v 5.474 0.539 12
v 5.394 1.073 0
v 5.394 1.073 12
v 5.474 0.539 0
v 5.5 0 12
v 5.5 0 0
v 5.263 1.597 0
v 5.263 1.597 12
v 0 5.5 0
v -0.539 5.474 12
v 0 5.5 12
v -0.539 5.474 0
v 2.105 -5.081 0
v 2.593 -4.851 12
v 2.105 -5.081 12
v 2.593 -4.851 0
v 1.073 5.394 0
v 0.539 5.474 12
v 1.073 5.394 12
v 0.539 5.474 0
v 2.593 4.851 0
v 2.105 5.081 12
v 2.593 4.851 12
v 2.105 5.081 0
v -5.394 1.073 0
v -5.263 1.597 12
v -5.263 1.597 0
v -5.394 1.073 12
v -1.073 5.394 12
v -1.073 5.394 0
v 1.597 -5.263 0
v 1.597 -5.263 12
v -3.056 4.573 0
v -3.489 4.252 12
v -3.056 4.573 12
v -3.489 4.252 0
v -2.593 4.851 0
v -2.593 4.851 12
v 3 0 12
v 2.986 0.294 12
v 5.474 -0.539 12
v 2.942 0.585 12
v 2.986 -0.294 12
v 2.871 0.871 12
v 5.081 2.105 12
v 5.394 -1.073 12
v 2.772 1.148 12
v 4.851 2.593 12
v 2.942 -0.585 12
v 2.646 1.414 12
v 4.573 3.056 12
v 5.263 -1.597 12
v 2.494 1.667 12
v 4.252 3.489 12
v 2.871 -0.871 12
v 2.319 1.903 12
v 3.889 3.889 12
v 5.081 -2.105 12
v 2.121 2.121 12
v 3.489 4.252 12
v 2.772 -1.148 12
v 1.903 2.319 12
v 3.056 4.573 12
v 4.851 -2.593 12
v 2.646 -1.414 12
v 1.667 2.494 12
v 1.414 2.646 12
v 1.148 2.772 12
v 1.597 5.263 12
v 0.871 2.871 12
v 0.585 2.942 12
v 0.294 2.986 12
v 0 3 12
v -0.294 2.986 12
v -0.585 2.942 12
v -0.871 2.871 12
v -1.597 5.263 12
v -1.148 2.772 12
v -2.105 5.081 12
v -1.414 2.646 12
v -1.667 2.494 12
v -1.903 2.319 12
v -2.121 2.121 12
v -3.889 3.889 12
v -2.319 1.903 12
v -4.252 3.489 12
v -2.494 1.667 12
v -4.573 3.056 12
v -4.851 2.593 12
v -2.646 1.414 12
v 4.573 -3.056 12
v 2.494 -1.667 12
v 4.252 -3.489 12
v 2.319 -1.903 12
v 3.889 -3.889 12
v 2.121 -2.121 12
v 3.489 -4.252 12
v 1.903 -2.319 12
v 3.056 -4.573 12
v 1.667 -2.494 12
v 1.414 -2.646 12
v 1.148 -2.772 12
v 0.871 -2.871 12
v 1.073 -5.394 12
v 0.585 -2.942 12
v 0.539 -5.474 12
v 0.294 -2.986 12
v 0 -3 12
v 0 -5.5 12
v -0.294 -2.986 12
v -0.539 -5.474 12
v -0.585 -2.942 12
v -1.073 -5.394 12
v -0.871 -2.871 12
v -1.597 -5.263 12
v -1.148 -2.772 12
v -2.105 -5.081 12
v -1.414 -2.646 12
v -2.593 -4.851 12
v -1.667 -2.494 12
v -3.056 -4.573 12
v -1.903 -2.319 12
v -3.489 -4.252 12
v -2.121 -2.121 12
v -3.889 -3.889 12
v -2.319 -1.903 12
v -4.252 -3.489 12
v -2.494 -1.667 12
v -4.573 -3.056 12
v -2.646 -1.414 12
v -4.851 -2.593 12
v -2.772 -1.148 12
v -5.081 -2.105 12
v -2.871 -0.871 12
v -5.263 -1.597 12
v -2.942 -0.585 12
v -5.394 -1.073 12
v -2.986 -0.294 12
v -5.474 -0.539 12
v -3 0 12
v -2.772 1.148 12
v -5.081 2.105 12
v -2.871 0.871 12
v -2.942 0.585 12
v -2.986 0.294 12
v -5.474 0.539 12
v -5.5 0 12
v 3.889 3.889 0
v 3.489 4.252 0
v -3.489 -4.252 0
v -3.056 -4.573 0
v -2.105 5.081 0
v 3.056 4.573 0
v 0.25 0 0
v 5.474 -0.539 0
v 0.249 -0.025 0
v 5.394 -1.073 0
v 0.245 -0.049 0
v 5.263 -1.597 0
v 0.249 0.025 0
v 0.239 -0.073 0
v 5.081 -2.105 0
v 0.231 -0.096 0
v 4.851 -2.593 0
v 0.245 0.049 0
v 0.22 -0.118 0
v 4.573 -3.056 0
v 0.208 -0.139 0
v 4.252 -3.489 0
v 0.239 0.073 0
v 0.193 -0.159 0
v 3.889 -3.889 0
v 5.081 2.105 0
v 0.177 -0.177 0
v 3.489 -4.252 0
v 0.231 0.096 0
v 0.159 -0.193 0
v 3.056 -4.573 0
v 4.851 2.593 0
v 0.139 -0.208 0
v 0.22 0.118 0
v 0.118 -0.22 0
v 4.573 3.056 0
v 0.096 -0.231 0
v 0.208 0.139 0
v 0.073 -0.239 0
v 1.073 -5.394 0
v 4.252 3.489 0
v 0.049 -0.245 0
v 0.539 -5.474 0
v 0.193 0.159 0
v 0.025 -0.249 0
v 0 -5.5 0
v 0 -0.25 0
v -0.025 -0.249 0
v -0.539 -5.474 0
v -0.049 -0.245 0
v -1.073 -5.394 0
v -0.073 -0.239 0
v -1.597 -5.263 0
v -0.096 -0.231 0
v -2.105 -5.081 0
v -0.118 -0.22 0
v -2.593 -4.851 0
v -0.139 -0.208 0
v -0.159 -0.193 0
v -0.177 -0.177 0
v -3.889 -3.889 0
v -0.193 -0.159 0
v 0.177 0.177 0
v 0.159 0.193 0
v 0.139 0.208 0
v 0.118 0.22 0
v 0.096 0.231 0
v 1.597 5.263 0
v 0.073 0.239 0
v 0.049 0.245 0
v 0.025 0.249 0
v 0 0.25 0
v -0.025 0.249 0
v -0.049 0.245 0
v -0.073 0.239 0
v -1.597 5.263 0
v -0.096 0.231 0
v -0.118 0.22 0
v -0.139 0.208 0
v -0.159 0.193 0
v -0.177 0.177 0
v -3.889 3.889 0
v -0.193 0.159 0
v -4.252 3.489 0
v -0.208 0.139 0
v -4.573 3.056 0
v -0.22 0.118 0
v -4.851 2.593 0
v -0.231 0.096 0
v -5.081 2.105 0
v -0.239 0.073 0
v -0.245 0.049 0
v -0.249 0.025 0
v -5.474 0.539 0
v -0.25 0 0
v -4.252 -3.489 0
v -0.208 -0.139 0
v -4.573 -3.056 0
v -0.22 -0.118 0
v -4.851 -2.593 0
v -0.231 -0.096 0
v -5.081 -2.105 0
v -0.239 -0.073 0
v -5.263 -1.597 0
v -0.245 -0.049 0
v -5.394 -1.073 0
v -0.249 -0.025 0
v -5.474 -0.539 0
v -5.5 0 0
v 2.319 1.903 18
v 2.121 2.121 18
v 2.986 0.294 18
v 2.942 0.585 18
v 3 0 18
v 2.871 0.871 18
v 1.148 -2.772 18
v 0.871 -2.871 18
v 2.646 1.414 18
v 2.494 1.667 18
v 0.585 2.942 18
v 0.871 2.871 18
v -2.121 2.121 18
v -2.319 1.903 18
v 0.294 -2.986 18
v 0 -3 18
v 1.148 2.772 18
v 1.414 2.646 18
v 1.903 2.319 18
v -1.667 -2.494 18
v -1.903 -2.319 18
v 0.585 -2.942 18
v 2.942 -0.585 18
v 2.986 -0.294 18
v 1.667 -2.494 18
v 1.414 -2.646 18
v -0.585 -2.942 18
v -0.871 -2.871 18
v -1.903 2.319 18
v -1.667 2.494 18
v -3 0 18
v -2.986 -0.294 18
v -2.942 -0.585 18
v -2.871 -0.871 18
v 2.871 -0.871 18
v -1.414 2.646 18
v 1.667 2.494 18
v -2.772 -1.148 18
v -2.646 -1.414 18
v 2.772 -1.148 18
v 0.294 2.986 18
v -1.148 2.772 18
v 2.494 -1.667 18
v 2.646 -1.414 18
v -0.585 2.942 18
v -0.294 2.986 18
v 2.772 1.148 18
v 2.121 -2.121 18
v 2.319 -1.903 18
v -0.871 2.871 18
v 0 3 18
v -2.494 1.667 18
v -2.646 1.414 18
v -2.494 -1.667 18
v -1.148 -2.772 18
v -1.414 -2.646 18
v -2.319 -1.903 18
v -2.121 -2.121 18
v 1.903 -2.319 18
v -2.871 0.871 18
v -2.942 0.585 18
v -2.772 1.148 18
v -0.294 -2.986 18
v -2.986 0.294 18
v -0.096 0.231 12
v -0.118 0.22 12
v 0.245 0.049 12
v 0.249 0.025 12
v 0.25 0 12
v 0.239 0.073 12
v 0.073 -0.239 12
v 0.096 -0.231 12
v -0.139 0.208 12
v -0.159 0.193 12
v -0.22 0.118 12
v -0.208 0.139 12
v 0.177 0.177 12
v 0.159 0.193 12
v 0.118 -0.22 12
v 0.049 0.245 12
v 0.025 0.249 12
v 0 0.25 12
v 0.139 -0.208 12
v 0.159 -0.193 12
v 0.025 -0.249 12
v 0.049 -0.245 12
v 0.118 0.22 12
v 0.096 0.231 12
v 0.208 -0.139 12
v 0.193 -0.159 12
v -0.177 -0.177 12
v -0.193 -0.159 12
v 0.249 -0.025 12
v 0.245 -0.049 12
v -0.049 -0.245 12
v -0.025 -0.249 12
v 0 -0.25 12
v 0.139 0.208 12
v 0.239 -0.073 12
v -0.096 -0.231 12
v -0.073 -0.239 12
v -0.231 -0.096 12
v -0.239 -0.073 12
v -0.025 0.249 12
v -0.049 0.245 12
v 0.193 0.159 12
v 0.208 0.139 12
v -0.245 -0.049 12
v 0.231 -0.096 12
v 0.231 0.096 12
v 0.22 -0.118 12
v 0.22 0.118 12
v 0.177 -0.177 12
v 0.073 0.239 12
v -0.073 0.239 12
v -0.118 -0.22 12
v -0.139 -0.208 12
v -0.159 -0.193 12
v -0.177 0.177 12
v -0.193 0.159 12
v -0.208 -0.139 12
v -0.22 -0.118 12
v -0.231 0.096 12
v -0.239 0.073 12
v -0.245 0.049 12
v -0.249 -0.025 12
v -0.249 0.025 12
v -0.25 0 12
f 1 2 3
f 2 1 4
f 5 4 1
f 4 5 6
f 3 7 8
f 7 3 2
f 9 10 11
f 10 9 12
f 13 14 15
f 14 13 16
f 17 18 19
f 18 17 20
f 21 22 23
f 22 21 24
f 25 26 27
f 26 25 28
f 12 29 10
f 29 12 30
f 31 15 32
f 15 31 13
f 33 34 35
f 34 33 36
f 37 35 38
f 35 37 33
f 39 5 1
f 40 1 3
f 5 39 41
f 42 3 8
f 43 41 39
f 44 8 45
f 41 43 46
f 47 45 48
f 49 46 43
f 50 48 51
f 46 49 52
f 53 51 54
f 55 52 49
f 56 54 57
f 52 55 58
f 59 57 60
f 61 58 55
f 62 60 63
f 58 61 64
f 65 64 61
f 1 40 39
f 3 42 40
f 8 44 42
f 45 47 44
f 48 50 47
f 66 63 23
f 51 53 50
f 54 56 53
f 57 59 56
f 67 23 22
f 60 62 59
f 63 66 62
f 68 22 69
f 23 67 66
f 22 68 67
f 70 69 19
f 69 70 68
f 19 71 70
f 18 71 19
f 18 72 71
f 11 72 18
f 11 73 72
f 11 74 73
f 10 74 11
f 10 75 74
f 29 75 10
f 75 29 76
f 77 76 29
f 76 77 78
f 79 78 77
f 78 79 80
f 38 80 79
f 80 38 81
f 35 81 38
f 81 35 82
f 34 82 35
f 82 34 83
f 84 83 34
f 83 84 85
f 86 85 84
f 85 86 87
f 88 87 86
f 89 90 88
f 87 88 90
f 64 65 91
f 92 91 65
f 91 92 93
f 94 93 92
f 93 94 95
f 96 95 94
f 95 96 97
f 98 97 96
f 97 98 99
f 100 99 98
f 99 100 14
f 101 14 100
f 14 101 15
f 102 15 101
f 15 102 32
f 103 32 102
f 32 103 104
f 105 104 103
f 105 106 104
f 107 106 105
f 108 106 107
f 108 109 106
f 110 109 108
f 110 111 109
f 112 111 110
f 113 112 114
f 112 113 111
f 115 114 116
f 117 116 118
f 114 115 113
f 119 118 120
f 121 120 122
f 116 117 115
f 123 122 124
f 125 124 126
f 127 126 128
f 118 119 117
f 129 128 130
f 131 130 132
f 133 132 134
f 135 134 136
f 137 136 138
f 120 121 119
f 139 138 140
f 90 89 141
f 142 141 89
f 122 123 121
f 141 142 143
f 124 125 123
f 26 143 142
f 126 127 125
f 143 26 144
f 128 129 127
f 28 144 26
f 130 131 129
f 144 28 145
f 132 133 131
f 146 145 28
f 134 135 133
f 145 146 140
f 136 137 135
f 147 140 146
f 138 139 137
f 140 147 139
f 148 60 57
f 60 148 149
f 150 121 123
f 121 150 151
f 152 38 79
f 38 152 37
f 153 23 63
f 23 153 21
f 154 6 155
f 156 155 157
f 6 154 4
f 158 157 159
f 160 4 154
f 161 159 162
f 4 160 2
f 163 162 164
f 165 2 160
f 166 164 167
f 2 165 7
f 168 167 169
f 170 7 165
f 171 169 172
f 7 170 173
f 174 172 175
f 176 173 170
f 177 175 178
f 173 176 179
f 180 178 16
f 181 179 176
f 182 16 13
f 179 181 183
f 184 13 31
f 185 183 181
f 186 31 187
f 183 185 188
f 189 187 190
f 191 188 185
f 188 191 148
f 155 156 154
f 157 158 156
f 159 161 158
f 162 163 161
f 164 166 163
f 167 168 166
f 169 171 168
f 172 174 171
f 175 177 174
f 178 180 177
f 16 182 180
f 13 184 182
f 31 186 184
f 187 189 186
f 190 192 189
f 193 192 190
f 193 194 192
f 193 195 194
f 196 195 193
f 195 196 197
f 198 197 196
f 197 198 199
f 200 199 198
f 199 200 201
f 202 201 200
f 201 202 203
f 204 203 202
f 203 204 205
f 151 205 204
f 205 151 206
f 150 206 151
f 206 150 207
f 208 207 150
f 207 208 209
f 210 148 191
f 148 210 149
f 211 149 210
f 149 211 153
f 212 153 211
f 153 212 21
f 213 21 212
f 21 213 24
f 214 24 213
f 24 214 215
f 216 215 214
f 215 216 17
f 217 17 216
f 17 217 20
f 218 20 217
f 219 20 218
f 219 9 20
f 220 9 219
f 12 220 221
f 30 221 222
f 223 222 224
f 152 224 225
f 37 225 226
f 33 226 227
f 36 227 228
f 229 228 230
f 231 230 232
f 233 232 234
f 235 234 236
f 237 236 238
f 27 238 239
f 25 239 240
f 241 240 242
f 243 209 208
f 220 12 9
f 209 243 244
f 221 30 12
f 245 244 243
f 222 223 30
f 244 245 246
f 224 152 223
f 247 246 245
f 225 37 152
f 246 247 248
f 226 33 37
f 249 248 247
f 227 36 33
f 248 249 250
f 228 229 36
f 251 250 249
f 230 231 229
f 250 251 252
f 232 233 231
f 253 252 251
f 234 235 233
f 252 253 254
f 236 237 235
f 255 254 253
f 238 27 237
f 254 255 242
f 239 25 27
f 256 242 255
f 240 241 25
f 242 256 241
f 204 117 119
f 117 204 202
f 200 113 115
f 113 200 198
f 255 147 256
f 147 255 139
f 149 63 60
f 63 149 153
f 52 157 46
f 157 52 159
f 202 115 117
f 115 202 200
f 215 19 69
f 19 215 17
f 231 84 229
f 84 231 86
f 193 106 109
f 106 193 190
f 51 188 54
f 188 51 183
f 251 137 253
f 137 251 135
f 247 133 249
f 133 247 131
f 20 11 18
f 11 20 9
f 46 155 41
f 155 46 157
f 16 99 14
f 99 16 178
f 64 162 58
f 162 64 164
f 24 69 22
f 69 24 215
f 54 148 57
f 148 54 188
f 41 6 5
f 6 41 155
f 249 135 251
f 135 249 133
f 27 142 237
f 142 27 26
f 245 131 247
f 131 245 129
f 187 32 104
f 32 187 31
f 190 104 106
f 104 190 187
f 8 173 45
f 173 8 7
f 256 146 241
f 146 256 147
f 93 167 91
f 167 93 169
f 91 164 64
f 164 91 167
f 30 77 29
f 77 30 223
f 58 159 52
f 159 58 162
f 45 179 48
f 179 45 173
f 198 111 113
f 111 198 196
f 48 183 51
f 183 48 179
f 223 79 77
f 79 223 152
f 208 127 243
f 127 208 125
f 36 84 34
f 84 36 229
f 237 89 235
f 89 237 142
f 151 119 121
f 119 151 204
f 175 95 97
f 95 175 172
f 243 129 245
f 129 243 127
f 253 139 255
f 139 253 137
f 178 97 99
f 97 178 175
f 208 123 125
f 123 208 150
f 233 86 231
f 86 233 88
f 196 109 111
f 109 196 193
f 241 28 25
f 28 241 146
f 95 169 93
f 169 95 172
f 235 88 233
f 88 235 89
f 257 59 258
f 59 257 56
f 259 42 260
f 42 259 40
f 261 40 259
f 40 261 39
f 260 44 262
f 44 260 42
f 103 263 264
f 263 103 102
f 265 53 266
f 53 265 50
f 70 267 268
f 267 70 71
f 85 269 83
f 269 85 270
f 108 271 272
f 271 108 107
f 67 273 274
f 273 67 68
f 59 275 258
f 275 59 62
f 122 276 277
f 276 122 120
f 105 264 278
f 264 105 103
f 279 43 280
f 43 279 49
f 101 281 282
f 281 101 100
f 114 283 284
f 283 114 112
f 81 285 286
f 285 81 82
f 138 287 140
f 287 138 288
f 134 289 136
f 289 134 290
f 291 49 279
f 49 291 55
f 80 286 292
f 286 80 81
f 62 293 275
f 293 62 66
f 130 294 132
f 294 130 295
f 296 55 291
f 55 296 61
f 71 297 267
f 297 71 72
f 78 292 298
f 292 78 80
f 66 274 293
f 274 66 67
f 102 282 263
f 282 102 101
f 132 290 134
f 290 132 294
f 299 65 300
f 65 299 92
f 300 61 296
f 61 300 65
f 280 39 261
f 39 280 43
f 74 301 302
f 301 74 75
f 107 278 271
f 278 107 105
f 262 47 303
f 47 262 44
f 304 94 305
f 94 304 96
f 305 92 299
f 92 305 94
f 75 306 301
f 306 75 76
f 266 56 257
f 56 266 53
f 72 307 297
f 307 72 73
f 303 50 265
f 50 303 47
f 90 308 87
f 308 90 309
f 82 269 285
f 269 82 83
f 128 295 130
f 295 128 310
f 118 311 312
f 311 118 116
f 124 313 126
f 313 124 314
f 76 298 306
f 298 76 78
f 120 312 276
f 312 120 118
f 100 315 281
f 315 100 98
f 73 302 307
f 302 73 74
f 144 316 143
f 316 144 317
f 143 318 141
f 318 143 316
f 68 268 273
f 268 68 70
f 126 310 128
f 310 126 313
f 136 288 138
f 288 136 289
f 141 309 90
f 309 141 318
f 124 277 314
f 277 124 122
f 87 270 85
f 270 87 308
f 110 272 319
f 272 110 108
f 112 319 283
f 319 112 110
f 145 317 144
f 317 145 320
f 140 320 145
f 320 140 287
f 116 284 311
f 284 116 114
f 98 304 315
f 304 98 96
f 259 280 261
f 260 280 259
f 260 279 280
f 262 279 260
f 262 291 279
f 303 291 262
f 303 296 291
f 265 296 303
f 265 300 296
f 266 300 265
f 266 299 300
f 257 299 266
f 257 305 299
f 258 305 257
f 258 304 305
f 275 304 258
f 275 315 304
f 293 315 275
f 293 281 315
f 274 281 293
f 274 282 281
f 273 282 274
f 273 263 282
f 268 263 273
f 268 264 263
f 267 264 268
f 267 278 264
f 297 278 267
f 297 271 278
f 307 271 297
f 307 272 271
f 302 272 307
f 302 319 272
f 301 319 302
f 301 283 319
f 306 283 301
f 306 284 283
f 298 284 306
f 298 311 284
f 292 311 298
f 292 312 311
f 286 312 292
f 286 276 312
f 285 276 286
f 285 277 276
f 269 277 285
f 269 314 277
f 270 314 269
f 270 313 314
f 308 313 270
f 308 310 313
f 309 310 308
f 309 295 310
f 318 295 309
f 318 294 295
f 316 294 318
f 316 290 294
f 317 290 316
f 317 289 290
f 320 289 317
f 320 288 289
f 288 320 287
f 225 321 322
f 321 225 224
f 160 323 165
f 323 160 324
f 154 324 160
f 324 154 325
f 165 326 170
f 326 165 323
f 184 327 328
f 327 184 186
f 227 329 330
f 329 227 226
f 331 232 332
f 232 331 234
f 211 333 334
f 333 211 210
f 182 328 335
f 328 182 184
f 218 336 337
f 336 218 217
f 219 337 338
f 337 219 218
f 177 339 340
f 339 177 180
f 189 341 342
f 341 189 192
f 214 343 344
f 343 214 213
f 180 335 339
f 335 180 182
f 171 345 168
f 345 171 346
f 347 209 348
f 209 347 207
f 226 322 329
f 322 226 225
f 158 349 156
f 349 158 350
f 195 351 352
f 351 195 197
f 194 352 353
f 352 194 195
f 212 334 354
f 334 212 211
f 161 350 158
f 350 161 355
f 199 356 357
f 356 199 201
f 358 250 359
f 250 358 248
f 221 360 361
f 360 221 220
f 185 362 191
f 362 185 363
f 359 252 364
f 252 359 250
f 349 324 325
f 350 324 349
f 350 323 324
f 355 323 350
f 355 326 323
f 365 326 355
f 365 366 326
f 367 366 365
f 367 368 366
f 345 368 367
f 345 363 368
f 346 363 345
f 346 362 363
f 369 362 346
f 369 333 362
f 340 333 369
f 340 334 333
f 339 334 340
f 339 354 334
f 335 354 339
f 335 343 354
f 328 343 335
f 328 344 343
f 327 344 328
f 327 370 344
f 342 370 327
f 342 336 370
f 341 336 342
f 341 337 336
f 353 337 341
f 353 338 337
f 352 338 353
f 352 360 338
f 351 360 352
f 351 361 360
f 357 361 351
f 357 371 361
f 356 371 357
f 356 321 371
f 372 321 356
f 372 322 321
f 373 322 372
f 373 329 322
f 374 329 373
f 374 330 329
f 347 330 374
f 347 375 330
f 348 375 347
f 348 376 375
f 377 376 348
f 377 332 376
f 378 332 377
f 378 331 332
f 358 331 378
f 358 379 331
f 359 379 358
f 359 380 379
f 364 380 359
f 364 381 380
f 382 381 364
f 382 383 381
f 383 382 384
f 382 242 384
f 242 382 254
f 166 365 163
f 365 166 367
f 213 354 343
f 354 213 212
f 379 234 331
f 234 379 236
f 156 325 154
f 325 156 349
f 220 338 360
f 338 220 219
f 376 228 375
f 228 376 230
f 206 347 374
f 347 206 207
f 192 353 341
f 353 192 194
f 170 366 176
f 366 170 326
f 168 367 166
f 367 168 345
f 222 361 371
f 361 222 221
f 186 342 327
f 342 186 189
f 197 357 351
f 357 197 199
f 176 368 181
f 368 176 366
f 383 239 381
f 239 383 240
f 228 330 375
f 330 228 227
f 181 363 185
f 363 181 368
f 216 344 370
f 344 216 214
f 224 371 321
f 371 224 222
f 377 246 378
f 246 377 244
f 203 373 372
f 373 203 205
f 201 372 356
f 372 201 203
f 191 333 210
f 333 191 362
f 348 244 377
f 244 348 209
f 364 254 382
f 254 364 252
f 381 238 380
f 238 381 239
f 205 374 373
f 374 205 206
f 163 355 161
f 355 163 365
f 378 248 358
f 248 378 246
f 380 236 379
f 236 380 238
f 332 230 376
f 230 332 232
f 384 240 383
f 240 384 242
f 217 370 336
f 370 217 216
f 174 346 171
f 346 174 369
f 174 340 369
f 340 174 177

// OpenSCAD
module potentiometer() {
    difference() {
        union() {
            // Main body
            cylinder(h = 12, d = 11, $fn = 64);
            // Knob
            translate([0, 0, 12])
                cylinder(h = 6, d = 6, $fn = 64);
        }
        // Shaft hole
        translate([0, 0, -1])
            cylinder(h = 13, d = 0.5, $fn = 64);
    }
}

potentiometer();
